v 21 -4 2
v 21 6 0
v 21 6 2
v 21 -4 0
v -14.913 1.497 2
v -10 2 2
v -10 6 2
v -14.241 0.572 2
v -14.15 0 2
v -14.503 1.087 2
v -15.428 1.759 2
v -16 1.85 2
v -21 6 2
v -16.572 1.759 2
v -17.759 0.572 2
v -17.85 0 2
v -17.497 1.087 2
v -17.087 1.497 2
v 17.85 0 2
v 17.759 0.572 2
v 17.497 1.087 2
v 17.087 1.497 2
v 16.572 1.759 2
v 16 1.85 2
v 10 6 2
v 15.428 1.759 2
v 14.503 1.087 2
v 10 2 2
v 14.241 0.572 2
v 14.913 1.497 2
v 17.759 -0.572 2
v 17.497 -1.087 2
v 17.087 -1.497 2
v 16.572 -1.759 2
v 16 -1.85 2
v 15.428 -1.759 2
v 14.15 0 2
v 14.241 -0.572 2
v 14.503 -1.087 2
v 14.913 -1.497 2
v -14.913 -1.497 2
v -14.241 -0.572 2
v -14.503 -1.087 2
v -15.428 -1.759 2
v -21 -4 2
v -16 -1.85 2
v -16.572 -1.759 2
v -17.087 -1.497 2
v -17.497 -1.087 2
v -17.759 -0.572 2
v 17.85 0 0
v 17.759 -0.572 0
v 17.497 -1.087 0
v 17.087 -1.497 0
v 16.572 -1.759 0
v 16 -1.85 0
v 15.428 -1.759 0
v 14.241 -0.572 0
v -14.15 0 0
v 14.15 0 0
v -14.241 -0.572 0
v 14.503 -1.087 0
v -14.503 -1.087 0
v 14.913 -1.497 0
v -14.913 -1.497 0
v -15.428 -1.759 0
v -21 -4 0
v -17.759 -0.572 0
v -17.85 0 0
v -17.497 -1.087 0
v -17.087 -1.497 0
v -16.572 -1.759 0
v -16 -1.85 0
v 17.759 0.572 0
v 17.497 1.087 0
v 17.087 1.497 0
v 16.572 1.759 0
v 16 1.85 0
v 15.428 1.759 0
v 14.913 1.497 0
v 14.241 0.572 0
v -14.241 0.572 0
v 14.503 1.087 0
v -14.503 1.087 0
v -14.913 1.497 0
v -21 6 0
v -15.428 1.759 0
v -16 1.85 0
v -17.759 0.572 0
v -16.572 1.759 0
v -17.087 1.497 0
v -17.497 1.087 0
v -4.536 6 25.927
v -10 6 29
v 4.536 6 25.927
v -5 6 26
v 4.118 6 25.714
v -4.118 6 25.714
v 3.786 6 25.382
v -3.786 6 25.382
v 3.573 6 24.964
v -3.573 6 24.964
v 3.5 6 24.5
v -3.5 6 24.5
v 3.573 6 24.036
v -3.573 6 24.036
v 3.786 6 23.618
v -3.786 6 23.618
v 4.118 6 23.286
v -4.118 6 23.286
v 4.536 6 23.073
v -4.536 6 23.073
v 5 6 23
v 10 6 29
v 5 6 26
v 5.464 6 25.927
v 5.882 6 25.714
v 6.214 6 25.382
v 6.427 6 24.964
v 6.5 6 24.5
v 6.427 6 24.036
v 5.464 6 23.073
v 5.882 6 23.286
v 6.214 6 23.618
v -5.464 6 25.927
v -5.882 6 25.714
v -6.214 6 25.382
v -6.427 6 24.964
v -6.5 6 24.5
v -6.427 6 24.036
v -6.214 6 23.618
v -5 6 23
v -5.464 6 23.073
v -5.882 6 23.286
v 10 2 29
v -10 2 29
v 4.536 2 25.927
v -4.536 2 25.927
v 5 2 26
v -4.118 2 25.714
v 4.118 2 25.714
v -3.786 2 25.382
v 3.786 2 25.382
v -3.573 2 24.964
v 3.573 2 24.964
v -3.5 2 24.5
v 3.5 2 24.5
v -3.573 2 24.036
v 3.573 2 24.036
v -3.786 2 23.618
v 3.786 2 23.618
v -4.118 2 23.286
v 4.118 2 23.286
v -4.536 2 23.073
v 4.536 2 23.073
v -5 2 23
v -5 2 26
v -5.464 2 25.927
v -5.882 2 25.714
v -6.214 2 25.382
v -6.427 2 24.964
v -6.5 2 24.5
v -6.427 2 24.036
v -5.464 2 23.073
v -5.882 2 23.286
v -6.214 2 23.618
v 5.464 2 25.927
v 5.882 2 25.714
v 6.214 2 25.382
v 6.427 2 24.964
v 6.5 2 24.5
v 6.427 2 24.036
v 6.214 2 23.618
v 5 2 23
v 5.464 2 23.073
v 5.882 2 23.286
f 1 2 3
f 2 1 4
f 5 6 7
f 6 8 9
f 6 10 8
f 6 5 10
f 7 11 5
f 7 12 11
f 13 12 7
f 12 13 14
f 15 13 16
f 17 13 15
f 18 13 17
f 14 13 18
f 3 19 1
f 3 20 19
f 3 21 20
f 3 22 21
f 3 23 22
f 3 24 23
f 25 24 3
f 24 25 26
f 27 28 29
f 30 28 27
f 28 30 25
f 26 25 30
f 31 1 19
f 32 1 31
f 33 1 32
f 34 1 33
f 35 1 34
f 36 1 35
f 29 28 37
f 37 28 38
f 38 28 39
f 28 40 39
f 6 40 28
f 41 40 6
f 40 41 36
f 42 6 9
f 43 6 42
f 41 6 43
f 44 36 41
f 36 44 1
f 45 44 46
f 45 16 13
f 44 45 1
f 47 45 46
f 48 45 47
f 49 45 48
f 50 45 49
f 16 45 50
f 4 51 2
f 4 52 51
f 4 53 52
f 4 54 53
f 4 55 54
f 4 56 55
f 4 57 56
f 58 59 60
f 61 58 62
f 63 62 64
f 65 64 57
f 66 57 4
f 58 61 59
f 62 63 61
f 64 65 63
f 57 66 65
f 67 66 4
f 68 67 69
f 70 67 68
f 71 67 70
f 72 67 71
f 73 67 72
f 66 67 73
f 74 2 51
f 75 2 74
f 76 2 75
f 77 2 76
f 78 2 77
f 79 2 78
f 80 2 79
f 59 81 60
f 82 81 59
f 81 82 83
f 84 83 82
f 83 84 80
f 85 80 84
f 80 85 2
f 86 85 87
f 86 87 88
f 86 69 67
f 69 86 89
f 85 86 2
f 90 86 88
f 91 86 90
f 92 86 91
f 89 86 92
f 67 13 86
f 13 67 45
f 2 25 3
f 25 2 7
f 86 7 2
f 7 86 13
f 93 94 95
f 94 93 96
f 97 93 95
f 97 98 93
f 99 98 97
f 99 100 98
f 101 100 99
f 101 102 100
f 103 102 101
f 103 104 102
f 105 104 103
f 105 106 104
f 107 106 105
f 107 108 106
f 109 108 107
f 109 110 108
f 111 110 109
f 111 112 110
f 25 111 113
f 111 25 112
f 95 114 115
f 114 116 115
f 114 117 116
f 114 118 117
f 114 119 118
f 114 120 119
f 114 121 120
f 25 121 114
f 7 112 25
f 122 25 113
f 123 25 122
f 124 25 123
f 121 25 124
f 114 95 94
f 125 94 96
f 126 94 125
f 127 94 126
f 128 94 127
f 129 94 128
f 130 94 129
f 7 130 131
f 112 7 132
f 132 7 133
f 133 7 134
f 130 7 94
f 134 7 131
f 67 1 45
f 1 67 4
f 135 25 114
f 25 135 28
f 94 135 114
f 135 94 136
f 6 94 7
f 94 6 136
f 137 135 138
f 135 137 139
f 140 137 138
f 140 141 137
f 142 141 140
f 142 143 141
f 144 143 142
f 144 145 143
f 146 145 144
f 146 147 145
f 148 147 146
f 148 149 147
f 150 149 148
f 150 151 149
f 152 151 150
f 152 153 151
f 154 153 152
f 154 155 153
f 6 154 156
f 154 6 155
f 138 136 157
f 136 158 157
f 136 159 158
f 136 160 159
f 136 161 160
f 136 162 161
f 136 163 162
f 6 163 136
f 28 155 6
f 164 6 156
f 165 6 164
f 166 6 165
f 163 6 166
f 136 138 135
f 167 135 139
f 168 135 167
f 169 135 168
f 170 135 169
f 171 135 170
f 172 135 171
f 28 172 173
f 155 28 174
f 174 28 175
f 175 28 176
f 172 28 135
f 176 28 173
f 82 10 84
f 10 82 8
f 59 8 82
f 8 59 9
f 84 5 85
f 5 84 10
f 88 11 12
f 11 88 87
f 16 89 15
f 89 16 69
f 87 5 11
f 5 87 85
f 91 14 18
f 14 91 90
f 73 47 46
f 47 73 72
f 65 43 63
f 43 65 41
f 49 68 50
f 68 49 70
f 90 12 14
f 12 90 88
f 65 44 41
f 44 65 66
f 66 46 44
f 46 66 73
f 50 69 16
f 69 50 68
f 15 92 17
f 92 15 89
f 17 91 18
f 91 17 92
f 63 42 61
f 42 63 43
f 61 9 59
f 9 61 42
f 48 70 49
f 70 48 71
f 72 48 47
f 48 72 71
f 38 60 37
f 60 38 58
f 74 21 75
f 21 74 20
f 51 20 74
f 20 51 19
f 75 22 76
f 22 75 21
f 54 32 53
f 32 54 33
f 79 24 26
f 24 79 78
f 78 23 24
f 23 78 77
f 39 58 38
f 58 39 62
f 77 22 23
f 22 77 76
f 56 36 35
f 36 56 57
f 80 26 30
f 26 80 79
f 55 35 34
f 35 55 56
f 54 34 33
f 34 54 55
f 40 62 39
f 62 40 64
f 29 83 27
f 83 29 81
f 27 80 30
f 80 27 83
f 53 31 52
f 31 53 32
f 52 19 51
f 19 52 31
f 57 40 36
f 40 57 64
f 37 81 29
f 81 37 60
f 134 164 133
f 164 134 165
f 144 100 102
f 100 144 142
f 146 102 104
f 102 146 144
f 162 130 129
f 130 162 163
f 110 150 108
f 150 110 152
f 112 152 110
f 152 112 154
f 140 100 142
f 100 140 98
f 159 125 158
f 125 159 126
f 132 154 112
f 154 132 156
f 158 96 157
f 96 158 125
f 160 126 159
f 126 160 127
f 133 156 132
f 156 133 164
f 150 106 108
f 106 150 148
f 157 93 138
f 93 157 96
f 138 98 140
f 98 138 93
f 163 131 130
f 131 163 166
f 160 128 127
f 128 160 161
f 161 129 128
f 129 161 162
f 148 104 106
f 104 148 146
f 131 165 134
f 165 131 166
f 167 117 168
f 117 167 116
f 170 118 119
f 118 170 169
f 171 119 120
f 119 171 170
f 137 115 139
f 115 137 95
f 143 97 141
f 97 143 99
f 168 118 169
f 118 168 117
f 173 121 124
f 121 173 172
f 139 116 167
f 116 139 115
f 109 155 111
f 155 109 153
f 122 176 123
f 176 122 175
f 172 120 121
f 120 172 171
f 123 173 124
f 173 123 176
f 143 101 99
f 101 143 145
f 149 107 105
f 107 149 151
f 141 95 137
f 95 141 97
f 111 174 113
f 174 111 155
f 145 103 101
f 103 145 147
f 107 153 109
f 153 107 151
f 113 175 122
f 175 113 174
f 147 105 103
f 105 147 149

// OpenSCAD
$fn=20;
difference(){
 union(){
translate([-21,-4,0])cube([42,4+6,2],center=false);
//translate([-6,4,0]) cube([12,6,2]);
translate([-10,2,0]) cube([20,4,9+20]);
}
translate([-32/2,0,0]) cylinder(r=3.7/2,h=4);
translate([32/2,0,0]) cylinder(r=3.7/2,h=4);

rotate([90,0,0]) translate([-5,2.5+2+20,-10])cylinder(r=1.5,h=100,$fn=20);
rotate([90,0,0]) translate([5,2.5+2+20,-10])cylinder(r=1.5,h=100,$fn=20);
}
